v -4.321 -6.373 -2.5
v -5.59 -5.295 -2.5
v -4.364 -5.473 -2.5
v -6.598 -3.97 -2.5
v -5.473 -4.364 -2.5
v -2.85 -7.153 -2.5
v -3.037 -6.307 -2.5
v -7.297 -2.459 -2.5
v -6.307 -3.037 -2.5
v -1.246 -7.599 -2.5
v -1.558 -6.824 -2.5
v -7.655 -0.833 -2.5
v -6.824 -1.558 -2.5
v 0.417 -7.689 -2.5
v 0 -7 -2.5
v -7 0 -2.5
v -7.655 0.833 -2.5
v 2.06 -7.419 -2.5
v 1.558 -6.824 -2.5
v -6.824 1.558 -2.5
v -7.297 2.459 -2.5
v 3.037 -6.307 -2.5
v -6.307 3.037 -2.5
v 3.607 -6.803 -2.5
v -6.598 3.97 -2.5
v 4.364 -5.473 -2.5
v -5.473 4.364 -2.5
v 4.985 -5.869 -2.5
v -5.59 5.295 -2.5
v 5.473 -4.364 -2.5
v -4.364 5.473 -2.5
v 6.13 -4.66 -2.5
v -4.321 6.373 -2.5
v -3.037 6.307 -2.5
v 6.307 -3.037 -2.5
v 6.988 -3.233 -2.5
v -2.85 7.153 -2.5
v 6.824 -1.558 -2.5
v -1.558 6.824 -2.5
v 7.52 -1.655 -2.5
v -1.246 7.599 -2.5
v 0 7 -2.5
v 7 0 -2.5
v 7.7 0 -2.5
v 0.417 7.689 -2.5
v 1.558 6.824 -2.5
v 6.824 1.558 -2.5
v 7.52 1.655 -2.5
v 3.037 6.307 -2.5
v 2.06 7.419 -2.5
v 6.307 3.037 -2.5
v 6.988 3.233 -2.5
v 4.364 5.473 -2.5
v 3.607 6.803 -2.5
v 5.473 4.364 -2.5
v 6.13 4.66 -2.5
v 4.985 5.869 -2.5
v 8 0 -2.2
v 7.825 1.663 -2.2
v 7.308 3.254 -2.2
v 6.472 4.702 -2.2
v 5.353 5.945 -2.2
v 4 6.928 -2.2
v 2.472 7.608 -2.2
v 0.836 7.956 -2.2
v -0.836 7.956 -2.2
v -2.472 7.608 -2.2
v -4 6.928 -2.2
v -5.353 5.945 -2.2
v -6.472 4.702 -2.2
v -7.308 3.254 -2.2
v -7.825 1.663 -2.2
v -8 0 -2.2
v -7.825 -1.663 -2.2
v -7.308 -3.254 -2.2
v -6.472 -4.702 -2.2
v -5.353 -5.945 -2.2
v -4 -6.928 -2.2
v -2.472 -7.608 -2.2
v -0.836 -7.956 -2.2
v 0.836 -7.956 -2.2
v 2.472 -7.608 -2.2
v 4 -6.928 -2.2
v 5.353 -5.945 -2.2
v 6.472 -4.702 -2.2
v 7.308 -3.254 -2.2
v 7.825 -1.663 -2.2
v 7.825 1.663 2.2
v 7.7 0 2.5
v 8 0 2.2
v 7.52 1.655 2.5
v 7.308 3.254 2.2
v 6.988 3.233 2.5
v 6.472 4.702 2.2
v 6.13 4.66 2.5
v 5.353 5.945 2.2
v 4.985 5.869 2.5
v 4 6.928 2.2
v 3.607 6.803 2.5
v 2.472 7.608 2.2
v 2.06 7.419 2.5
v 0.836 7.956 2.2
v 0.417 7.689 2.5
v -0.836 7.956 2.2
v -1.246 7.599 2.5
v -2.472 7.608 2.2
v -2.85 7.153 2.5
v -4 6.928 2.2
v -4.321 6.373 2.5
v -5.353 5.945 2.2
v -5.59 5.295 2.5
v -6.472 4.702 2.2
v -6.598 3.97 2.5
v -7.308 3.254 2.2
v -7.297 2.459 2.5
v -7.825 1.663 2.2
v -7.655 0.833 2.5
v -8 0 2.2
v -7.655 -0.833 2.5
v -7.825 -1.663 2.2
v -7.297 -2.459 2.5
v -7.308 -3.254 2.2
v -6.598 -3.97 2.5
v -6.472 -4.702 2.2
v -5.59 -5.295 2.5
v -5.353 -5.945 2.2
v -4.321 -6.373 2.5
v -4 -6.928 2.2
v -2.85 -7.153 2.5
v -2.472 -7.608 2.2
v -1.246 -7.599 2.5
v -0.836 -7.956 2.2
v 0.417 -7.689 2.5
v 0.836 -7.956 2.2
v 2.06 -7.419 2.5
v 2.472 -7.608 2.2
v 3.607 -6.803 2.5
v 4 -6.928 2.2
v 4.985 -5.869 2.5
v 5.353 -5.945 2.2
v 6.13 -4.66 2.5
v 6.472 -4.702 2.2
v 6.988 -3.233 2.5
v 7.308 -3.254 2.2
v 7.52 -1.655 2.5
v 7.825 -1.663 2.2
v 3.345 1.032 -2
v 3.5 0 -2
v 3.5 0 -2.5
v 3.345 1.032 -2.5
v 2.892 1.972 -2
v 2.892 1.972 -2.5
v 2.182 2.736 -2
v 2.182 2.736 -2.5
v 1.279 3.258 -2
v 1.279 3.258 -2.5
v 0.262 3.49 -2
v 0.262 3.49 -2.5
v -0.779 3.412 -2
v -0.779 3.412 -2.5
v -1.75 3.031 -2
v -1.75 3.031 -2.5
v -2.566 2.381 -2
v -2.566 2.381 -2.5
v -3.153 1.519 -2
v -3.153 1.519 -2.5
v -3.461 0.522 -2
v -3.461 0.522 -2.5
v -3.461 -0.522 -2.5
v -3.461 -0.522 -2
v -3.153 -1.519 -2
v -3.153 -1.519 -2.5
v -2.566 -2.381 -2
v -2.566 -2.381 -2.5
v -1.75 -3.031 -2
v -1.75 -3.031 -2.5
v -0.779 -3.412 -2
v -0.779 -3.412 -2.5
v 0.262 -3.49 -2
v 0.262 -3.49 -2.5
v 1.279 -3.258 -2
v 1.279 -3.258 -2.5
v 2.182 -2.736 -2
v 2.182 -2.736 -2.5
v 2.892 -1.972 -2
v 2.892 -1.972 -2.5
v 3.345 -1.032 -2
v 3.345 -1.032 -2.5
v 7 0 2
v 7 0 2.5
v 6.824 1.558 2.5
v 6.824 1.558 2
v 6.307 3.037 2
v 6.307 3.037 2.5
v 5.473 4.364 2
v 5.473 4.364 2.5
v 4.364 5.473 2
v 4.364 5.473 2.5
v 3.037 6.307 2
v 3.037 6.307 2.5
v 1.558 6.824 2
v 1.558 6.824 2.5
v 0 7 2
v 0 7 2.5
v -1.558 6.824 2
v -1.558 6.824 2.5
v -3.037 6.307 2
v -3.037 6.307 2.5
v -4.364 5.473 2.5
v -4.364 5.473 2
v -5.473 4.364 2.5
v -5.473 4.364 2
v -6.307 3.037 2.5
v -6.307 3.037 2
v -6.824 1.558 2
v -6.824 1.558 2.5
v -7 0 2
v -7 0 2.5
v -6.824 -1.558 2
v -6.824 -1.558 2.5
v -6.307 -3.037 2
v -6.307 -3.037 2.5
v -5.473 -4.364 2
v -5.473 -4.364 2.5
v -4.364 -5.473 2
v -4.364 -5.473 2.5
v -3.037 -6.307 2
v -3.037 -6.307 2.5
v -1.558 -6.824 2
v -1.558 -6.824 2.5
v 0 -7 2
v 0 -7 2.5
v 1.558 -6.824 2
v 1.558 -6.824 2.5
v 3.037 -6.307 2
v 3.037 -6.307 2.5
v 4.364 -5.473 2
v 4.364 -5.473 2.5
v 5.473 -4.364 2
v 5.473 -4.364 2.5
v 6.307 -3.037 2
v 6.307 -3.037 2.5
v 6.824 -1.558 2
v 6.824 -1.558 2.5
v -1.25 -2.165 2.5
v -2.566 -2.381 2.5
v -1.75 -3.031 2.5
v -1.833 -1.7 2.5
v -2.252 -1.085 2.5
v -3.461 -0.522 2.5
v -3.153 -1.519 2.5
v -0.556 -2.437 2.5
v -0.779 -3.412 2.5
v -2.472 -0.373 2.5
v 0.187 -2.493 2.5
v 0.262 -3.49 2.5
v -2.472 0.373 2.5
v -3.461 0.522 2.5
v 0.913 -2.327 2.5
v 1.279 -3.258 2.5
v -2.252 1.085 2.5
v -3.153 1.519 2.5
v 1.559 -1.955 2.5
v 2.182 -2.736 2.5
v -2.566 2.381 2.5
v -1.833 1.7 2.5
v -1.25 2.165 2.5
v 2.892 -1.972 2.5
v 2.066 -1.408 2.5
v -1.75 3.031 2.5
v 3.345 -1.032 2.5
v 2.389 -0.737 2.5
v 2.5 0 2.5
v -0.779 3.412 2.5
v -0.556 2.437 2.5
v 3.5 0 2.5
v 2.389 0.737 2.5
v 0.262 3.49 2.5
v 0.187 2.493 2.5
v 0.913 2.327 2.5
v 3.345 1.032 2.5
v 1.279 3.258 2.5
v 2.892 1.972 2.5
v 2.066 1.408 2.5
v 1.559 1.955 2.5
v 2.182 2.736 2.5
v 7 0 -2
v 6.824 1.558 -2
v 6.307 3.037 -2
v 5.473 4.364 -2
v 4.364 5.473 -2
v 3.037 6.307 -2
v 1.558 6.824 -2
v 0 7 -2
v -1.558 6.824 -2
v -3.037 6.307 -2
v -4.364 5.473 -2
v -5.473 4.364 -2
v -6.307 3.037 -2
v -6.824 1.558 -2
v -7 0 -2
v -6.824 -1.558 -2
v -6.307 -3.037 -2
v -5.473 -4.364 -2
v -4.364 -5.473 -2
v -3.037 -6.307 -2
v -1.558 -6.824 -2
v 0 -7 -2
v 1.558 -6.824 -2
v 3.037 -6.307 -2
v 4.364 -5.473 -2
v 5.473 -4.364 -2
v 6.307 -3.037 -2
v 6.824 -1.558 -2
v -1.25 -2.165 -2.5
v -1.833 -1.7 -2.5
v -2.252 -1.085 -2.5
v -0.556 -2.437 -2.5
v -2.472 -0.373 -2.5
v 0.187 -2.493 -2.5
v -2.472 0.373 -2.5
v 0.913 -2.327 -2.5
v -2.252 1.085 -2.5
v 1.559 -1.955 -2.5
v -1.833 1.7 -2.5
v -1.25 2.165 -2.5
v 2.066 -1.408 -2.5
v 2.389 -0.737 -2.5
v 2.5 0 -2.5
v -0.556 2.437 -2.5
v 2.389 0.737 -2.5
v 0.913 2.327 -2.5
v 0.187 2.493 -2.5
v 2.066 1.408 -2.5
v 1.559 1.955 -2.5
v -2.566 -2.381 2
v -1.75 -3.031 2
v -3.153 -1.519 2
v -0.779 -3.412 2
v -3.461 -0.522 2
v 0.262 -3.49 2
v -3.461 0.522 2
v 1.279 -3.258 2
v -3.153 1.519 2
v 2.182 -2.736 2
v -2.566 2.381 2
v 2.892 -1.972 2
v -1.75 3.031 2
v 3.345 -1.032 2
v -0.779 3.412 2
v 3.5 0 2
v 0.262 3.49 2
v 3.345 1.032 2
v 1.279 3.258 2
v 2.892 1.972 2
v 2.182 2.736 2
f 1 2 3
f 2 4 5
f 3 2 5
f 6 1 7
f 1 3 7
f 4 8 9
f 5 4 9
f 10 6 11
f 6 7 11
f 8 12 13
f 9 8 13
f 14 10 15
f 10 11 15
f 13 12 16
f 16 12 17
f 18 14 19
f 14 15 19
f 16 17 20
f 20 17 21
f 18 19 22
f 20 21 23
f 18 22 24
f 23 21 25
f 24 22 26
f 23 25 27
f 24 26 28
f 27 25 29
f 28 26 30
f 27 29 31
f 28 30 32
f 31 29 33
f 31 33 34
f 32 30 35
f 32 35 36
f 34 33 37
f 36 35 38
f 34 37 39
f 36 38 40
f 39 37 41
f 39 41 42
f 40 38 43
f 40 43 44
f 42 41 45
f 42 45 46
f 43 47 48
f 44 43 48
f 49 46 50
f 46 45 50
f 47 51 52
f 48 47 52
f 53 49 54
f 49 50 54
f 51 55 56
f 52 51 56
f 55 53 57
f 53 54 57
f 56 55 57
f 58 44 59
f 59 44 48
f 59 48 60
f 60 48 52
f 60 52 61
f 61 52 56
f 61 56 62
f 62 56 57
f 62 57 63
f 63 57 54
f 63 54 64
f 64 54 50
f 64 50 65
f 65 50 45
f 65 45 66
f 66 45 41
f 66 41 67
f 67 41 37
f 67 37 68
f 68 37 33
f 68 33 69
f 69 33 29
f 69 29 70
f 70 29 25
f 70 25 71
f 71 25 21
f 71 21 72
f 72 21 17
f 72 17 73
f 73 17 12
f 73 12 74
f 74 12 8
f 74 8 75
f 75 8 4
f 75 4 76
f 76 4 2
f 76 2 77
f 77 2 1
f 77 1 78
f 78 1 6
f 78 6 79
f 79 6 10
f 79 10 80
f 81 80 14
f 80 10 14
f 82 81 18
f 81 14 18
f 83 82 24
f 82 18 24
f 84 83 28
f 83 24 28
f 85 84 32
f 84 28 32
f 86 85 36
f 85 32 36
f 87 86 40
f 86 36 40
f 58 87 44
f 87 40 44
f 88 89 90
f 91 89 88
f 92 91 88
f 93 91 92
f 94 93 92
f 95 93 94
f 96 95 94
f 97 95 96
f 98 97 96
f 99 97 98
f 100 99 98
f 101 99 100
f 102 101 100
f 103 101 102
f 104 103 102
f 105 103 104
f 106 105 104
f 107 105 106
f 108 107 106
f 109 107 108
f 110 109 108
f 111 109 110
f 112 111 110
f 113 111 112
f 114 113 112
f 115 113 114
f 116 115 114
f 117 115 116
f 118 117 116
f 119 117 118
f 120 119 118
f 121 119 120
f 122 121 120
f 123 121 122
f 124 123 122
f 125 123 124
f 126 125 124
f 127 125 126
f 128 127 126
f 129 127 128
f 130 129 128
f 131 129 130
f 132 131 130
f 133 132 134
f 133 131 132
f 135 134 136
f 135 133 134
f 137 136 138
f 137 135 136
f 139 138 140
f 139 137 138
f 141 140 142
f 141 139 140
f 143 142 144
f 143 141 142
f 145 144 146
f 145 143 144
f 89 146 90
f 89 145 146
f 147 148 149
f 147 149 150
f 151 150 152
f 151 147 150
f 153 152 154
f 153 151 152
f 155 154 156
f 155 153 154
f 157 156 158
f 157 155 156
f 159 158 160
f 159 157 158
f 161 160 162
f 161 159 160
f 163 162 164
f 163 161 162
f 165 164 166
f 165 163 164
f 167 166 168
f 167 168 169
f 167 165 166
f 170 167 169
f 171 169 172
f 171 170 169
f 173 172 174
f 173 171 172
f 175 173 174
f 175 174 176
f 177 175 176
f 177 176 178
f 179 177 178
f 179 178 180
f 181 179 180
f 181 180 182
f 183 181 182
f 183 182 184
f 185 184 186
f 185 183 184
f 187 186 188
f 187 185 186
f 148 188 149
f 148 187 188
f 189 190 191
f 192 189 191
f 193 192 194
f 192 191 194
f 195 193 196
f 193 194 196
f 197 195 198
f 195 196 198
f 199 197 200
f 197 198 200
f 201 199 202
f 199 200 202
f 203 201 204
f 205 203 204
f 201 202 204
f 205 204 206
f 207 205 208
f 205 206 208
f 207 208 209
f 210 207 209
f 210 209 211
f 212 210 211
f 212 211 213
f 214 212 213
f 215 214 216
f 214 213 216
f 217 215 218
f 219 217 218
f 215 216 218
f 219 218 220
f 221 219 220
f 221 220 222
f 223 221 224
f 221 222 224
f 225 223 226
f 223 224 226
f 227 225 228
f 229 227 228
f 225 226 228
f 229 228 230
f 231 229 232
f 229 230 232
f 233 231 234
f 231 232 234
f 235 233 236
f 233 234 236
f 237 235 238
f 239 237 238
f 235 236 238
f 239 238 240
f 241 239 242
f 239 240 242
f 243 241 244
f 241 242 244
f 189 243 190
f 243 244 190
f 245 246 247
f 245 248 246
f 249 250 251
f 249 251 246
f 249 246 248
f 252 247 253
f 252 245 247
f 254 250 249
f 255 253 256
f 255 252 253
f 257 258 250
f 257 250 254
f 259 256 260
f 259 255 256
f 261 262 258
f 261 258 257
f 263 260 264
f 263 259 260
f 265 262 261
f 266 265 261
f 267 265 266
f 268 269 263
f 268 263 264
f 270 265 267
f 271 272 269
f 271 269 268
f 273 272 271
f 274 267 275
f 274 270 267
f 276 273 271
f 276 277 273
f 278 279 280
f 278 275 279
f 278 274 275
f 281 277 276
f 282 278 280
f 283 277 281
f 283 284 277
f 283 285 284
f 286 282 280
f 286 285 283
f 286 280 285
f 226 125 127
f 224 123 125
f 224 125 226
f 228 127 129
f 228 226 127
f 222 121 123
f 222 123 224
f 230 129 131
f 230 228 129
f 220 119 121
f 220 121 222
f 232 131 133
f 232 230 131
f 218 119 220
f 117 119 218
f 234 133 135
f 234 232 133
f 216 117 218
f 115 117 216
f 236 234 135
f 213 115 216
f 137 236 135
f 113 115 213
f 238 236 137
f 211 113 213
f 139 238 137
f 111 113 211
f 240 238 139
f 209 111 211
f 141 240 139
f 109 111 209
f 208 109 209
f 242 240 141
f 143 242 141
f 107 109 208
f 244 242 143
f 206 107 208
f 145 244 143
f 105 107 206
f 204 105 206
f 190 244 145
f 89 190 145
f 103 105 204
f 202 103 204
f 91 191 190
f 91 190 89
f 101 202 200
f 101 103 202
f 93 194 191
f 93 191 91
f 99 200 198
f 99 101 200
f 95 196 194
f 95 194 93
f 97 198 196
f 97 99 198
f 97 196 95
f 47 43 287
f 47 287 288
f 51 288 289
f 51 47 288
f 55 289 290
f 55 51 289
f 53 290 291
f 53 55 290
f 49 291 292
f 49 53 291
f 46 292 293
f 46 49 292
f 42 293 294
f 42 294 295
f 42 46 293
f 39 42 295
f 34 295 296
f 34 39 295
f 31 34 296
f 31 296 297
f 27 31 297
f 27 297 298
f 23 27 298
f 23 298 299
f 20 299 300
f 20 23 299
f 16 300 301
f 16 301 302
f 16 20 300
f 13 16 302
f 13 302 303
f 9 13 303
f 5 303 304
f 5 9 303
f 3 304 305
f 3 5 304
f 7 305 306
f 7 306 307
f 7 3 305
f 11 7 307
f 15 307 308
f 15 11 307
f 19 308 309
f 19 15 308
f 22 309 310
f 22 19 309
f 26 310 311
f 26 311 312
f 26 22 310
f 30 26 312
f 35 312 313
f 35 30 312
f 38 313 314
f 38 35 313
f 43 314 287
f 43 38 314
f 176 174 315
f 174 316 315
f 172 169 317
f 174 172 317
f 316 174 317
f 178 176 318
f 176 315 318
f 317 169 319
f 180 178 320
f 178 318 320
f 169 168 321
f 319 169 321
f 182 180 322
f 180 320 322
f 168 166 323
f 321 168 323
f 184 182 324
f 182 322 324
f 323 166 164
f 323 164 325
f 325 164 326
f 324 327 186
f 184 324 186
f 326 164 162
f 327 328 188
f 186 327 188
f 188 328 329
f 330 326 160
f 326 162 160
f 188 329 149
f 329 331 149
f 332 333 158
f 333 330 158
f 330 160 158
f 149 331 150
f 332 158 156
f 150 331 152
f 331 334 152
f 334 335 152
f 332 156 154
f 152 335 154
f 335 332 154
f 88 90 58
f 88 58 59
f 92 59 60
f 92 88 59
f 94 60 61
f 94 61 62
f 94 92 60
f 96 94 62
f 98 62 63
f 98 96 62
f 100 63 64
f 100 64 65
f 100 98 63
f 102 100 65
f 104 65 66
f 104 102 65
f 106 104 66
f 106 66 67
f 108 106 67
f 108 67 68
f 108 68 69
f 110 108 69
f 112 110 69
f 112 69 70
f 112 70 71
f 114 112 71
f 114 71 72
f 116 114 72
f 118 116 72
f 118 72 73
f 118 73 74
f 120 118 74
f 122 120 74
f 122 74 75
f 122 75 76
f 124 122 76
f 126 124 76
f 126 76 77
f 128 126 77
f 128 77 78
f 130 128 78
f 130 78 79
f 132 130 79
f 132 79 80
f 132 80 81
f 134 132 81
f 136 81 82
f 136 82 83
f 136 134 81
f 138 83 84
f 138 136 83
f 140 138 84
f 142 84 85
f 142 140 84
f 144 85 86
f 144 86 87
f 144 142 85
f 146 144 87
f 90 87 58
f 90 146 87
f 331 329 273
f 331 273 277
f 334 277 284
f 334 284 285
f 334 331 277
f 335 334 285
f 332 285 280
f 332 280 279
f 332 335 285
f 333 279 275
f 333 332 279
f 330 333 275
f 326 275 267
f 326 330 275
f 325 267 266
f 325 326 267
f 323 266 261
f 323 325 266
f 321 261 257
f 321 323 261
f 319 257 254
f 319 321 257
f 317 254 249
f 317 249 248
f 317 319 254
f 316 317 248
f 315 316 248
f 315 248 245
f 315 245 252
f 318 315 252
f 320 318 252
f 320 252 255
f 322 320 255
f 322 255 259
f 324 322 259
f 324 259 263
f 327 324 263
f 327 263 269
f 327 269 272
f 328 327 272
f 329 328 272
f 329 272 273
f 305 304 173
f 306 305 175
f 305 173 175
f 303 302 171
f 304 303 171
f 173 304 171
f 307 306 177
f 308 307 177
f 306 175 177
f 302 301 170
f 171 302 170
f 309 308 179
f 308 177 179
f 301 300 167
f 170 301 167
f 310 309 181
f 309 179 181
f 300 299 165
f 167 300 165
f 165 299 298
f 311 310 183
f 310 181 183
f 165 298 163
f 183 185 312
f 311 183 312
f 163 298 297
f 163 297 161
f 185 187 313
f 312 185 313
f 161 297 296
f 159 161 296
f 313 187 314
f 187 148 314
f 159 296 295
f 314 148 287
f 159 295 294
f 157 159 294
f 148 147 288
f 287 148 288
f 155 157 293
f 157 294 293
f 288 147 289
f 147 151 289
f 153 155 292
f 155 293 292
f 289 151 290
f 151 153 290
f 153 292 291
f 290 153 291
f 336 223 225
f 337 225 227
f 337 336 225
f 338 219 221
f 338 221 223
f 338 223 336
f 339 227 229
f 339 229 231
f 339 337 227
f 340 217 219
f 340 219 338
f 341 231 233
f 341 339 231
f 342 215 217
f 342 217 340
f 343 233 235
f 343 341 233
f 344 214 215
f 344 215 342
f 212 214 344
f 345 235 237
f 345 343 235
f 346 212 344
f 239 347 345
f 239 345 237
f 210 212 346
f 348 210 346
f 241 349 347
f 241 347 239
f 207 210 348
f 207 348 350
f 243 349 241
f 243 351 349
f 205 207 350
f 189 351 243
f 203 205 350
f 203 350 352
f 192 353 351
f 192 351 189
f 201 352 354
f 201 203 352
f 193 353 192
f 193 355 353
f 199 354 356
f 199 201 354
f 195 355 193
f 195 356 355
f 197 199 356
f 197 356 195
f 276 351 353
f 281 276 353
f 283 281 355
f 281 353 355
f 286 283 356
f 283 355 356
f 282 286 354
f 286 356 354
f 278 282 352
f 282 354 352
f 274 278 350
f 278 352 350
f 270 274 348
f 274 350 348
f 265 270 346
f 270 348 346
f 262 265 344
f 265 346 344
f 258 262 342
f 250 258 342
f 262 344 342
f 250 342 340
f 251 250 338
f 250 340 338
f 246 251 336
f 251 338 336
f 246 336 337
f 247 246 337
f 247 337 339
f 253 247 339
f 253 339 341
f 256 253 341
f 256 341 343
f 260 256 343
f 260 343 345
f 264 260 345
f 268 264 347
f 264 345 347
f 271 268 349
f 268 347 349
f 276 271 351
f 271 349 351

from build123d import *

# Parameters (mm, degrees)
F0_R     = 8
F1_DEPTH = 2.5
F2_R     = 7
F3_DEPTH = 0.5
F4_R     = 3.5
F5_DEPTH = 0.5
F6_R     = 2.5
F7_DEPTH = 25
F9_SIZE  = 0.3


with BuildPart() as f1:
    # F0 (on Top) → F1 (new body)
    with BuildSketch(Plane.XY):
        Circle(F0_R)
    extrude(amount=F1_DEPTH)

    # F2 (on face) → F3 (cut)
    with BuildSketch(Plane.XY.offset(2.5)):
        Circle(F2_R)
    extrude(amount=-F3_DEPTH, mode=Mode.SUBTRACT)

    # F4 (on face) → F5 (join)
    with BuildSketch(Plane.XY.offset(2)):
        Circle(F4_R)
    extrude(amount=F5_DEPTH)

    # F6 (on face) → F7 (cut)
    with BuildSketch(Plane.XY.offset(2.5)):
        Circle(F6_R)
    extrude(amount=-F7_DEPTH, mode=Mode.SUBTRACT)

    # F8: F1 across face


with BuildPart() as f1_1:
    add(f1.part)
    add(f1.part.mirror(Plane(origin=(0, 0, 0), x_dir=(1, 0, 0), z_dir=(0, 0, -1))))

    # F9
    f9_edges = [f1_1.edges().sort_by_distance(p)[0] for p in [
        (-8, 0, 2.5),
        (-8, 0, -2.5),
    ]]
    chamfer(f9_edges, length=F9_SIZE)


solid = f1_1.part
